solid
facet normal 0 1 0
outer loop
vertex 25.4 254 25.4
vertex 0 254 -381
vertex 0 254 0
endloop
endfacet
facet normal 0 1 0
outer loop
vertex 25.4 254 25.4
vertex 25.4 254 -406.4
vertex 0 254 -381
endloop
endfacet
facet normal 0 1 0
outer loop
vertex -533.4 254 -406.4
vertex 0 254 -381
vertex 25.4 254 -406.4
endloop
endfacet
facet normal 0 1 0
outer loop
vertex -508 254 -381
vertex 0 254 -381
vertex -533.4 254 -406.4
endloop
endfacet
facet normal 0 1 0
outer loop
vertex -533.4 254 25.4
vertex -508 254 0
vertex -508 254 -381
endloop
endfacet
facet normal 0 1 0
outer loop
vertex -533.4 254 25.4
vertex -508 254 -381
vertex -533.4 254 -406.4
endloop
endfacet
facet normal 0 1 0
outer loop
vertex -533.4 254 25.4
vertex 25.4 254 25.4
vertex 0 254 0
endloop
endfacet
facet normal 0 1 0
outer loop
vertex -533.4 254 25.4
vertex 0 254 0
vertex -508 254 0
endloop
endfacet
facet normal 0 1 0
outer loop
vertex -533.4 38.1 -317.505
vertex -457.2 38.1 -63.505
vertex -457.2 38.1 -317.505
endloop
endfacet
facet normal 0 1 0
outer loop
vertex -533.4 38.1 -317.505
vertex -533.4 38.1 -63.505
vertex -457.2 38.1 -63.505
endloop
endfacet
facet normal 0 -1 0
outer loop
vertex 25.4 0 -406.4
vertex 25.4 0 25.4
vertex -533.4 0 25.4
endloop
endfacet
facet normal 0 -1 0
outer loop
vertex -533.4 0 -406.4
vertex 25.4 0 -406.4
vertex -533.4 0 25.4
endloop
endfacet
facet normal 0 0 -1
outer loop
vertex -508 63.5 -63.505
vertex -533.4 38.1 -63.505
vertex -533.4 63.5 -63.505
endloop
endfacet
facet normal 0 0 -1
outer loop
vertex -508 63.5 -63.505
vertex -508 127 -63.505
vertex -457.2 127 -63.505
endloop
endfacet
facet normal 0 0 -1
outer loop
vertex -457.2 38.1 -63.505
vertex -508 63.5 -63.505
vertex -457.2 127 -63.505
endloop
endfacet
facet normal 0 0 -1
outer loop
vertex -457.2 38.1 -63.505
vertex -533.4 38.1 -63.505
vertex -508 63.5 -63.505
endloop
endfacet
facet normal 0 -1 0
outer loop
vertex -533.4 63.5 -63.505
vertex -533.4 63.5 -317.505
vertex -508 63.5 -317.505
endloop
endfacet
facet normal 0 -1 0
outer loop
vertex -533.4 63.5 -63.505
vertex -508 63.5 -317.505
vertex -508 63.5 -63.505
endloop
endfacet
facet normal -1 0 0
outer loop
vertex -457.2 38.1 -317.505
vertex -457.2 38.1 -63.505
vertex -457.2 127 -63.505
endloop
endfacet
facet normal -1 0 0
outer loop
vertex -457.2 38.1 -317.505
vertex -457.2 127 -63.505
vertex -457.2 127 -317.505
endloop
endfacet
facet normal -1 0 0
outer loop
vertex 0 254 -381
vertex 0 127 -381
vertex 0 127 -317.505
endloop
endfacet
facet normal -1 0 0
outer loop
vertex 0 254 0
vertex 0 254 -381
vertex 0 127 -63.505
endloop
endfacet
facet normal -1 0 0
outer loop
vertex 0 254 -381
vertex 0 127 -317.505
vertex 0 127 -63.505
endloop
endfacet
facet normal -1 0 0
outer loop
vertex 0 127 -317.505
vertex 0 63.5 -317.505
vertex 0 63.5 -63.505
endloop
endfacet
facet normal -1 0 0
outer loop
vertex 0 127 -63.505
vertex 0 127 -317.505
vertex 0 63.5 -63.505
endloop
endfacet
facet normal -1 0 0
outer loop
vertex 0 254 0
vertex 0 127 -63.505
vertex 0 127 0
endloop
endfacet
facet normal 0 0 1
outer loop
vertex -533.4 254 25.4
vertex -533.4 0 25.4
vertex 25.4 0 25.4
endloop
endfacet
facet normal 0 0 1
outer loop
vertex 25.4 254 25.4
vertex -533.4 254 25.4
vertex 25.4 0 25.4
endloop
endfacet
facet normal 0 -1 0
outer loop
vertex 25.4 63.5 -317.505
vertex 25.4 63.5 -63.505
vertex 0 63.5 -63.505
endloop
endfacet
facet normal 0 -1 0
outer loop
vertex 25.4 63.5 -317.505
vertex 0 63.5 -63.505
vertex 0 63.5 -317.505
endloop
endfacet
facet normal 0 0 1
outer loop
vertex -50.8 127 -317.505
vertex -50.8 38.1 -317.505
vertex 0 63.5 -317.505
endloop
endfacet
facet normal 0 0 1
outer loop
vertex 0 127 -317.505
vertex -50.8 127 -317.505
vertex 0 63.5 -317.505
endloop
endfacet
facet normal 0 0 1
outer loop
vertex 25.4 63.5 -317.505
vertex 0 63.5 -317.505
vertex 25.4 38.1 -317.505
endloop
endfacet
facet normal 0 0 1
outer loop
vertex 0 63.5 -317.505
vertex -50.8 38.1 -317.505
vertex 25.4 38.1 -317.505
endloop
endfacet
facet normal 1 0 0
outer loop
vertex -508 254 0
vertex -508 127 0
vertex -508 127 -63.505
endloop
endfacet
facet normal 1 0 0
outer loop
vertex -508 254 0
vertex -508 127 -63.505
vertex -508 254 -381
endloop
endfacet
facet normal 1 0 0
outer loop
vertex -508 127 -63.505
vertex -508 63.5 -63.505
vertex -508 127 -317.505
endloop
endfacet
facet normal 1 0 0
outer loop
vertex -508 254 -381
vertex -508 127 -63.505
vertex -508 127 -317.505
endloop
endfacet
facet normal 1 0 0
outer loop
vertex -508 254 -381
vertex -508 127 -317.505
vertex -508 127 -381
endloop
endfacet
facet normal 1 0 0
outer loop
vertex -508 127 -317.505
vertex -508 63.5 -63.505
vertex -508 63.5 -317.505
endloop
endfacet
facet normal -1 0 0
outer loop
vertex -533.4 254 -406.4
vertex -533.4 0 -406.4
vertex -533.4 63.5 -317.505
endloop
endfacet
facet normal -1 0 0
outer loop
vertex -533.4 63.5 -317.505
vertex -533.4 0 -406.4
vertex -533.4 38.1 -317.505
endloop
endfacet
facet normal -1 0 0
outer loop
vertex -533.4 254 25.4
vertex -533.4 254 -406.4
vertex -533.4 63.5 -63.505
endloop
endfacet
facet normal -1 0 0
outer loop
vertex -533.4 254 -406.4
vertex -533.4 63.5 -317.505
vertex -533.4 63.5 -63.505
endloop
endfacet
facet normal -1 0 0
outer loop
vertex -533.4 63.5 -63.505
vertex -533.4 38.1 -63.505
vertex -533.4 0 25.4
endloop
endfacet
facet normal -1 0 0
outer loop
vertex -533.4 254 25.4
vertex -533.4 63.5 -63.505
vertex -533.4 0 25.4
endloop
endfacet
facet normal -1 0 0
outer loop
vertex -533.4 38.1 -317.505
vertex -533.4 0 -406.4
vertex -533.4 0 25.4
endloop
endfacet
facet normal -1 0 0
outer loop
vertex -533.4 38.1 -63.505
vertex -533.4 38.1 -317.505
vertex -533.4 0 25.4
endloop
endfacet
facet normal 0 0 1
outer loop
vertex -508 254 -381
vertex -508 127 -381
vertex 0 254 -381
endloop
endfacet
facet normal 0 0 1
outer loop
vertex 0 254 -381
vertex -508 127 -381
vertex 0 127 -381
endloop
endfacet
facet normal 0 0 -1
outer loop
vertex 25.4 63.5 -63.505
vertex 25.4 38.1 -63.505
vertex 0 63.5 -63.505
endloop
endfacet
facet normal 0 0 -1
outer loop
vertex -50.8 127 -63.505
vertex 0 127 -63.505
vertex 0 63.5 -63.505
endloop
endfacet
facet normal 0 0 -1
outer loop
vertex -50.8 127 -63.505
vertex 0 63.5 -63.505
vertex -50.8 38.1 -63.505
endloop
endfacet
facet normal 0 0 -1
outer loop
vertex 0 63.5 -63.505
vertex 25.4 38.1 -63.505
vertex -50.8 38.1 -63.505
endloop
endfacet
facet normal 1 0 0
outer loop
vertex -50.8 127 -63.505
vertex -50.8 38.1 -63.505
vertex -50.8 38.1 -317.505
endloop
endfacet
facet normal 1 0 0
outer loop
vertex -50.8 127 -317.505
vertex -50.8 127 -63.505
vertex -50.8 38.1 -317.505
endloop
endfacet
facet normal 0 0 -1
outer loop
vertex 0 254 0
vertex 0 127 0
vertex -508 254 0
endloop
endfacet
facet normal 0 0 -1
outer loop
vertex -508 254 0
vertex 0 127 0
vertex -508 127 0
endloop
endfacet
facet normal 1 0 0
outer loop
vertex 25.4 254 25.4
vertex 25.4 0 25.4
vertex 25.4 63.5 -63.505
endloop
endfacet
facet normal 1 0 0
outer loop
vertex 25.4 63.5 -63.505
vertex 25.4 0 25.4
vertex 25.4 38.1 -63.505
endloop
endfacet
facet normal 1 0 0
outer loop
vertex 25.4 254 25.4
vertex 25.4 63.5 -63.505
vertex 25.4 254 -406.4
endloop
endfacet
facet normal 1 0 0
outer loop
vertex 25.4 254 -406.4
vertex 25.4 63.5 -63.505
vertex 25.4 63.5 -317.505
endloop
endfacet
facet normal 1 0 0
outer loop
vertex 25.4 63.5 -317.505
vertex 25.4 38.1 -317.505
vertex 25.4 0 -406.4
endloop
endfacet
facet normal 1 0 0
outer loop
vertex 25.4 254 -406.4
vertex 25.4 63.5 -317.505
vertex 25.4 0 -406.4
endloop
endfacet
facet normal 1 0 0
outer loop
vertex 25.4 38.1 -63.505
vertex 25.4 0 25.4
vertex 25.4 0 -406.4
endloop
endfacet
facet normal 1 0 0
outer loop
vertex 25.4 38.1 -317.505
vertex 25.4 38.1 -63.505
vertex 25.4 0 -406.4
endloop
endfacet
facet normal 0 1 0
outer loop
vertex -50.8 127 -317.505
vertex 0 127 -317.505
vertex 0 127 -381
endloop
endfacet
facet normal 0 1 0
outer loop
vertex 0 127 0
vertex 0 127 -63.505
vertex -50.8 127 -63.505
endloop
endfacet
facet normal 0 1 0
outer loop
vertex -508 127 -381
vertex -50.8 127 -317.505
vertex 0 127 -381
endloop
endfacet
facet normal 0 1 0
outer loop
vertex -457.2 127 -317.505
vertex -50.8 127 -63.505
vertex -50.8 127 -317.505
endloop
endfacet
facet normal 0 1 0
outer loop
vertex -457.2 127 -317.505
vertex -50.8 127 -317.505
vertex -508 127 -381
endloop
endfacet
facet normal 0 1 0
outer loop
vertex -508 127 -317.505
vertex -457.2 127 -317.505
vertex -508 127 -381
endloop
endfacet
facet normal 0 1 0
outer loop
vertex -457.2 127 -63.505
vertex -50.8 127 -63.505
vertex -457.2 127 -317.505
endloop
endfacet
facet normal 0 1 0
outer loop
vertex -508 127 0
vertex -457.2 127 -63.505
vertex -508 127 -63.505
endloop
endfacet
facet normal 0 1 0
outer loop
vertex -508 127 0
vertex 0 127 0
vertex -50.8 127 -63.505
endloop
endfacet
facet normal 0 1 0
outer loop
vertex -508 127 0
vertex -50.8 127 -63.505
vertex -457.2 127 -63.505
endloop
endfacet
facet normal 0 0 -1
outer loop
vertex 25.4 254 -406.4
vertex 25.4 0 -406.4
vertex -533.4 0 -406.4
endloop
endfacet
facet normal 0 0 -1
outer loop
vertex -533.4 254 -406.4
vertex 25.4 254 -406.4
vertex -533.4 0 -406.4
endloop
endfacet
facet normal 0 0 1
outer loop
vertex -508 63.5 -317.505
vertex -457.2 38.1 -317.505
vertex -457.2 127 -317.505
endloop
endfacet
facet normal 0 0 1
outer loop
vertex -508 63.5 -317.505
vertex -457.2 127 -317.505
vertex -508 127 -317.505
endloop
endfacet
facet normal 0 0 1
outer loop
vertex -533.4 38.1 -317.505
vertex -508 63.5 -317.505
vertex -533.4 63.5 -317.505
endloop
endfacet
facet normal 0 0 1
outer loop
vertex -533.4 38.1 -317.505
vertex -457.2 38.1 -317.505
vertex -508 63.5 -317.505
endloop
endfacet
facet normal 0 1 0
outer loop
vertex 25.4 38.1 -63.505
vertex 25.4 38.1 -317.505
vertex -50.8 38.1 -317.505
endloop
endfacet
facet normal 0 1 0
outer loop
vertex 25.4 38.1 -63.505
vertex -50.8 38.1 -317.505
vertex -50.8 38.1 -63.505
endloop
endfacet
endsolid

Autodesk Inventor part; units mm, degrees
ref_plane "YZ Plane" through (0, 0, 0) normal (1, 0, 0) x (0, 1, 0)
ref_plane "XZ Plane" through (0, 0, 0) normal (0, 1, 0) x (-1, 0, 0)
ref_plane "XY Plane" through (0, 0, 0) normal (0, 0, 1) x (1, 0, 0)
sketch "Sketch1" plane through (0, 0, 0) normal (0, 1, 0) x (-1, 0, 0)
  line L0 (0, 0) -> (508, 0)
  line L1 (508, 0) -> (508, -381)
  line L2 (508, -381) -> (0, -381)
  line L3 (0, -381) -> (0, 0)
  line L4 (0, 0) -> (50.8, 0)
  line L5 (0, 0) -> (0, -12.7)
  line L6 (0, -6.35) -> (0, -57.1551)
  line L7 (0, -6.35) -> (50.8, -6.35)
  line L8 (50.8, -6.35) -> (50.8, -57.1551)
  line L9 (50.8, -57.1551) -> (0, -57.1551)
  line L10 (0, -57.1551) -> (0, -6.35)
  line L11 (0, -57.1551) -> (0, -66.0049)
  line L12 (0, -57.1551) -> (0, -69.8551)
  line L13 (0, -57.1551) -> (0, -63.5051)
  line L14 (0, -63.5051) -> (0, -317.5051)
  line L15 (0, -63.5051) -> (50.8, -63.5051)
  line L16 (50.8, -63.5051) -> (50.8, -317.5051)
  line L17 (50.8, -317.5051) -> (0, -317.5051)
  line L18 (0, -317.5051) -> (0, -63.5051)
  line L19 (0, -381) -> (0, -374.6428)
  line L20 (0, -317.5051) -> (0, -323.8478)
  line L21 (0, -323.8478) -> (50.8, -323.8478)
  line L22 (50.8, -323.8478) -> (50.8, -374.6428)
  line L23 (50.8, -374.6428) -> (0, -374.6428)
  line L24 (0, -374.6428) -> (0, -323.8478)
  line L25 (508, 0) -> (457.2, 0)
  line L26 (508, -6.35) -> (457.2, -6.35)
  line L27 (457.2, -6.35) -> (457.2, -57.1551)
  line L28 (457.2, -57.1551) -> (508, -57.1551)
  line L29 (508, -57.1551) -> (508, -6.35)
  line L30 (508, -63.5051) -> (457.2, -63.5051)
  line L31 (457.2, -63.5051) -> (457.2, -317.5051)
  line L32 (457.2, -317.5051) -> (508, -317.5051)
  line L33 (508, -317.5051) -> (508, -63.5051)
  line L34 (508, -323.8478) -> (457.2, -323.8478)
  line L35 (457.2, -323.8478) -> (457.2, -374.6428)
  line L36 (457.2, -374.6428) -> (508, -374.6428)
  line L37 (508, -374.6428) -> (508, -323.8478)
  line L38 (508, 0) -> (533.4, 0)
  line L39 (533.4, 0) -> (533.4, 25.4)
  line L40 (0, -381) -> (-25.4, -381)
  line L41 (-25.4, -381) -> (-25.4, -406.4)
  line L42 (533.4, 25.4) -> (-25.4, 25.4)
  line L43 (-25.4, 25.4) -> (-25.4, -406.4)
  line L44 (-25.4, -406.4) -> (533.4, -406.4)
  line L45 (533.4, -406.4) -> (533.4, 25.4)
extrude "Extrusion1" add sketch "Sketch1" along normal blind 254 contours L3 L40 L43 L42 L39 L38 L0 | L38 L45 L44 L41 L40 L2 L1
extrude "Extrusion2" add sketch "Sketch1" along normal blind 127 contours L0 L1 L26 L27 L28 L30 L31 L32 L34 L35 L36 L2 L3 L23 L22 L21 L17 L16 L15 L9 L8 L7
extrude "Extrusion3" add sketch "Sketch1" along normal blind 127 contours L7 L8 L9 L3 | L1 L28 L27 L26 | L1 L36 L35 L34 | L21 L22 L23 L3
extrude "Extrusion4" add sketch "Sketch1" along normal blind 38.1 contours L15 L16 L17 L3 | L1 L32 L31 L30
sketch "Sketch2" plane through (25.4, 0, 25.4) normal (1, 0, 0) x (0, 0, -1)
  line L0 (342.9051, 38.1) -> (88.9051, 38.1) projected
  line L1 (88.9051, 38.1) -> (88.9051, 63.5)
  line L2 (88.9051, 127) -> (88.9051, 38.1) projected
  line L3 (88.9051, 63.5) -> (342.9051, 63.5)
  line L4 (342.9051, 63.5) -> (342.9051, 38.1)
  line L5 (342.9051, 38.1) -> (88.9051, 38.1)
  line L6 (88.9051, 38.1) -> (88.9051, 63.5)
  point P0 (25.4, 0)
  dimension "d21" = 25.4
extrude "Extrusion5" cut sketch "Sketch2" against normal blind 76.2
sketch "Sketch3" plane through (-533.4, 0, -406.4) normal (-1, 0, 0) x (0, 0, 1)
  line L0 (88.8949, 63.5) -> (88.8949, 38.1) projected
  line L1 (342.8949, 38.1) -> (342.8949, 127) projected
  line L2 (88.8949, 63.5) -> (342.8949, 63.5)
  line L3 (342.8949, 63.5) -> (342.8949, 38.1)
  line L4 (342.8949, 38.1) -> (88.8949, 38.1)
  line L5 (88.8949, 38.1) -> (88.8949, 63.5)
  point P0 (406.4, 0)
extrude "Extrusion6" cut sketch "Sketch3" against normal blind 76.2
properties part number "Board"
